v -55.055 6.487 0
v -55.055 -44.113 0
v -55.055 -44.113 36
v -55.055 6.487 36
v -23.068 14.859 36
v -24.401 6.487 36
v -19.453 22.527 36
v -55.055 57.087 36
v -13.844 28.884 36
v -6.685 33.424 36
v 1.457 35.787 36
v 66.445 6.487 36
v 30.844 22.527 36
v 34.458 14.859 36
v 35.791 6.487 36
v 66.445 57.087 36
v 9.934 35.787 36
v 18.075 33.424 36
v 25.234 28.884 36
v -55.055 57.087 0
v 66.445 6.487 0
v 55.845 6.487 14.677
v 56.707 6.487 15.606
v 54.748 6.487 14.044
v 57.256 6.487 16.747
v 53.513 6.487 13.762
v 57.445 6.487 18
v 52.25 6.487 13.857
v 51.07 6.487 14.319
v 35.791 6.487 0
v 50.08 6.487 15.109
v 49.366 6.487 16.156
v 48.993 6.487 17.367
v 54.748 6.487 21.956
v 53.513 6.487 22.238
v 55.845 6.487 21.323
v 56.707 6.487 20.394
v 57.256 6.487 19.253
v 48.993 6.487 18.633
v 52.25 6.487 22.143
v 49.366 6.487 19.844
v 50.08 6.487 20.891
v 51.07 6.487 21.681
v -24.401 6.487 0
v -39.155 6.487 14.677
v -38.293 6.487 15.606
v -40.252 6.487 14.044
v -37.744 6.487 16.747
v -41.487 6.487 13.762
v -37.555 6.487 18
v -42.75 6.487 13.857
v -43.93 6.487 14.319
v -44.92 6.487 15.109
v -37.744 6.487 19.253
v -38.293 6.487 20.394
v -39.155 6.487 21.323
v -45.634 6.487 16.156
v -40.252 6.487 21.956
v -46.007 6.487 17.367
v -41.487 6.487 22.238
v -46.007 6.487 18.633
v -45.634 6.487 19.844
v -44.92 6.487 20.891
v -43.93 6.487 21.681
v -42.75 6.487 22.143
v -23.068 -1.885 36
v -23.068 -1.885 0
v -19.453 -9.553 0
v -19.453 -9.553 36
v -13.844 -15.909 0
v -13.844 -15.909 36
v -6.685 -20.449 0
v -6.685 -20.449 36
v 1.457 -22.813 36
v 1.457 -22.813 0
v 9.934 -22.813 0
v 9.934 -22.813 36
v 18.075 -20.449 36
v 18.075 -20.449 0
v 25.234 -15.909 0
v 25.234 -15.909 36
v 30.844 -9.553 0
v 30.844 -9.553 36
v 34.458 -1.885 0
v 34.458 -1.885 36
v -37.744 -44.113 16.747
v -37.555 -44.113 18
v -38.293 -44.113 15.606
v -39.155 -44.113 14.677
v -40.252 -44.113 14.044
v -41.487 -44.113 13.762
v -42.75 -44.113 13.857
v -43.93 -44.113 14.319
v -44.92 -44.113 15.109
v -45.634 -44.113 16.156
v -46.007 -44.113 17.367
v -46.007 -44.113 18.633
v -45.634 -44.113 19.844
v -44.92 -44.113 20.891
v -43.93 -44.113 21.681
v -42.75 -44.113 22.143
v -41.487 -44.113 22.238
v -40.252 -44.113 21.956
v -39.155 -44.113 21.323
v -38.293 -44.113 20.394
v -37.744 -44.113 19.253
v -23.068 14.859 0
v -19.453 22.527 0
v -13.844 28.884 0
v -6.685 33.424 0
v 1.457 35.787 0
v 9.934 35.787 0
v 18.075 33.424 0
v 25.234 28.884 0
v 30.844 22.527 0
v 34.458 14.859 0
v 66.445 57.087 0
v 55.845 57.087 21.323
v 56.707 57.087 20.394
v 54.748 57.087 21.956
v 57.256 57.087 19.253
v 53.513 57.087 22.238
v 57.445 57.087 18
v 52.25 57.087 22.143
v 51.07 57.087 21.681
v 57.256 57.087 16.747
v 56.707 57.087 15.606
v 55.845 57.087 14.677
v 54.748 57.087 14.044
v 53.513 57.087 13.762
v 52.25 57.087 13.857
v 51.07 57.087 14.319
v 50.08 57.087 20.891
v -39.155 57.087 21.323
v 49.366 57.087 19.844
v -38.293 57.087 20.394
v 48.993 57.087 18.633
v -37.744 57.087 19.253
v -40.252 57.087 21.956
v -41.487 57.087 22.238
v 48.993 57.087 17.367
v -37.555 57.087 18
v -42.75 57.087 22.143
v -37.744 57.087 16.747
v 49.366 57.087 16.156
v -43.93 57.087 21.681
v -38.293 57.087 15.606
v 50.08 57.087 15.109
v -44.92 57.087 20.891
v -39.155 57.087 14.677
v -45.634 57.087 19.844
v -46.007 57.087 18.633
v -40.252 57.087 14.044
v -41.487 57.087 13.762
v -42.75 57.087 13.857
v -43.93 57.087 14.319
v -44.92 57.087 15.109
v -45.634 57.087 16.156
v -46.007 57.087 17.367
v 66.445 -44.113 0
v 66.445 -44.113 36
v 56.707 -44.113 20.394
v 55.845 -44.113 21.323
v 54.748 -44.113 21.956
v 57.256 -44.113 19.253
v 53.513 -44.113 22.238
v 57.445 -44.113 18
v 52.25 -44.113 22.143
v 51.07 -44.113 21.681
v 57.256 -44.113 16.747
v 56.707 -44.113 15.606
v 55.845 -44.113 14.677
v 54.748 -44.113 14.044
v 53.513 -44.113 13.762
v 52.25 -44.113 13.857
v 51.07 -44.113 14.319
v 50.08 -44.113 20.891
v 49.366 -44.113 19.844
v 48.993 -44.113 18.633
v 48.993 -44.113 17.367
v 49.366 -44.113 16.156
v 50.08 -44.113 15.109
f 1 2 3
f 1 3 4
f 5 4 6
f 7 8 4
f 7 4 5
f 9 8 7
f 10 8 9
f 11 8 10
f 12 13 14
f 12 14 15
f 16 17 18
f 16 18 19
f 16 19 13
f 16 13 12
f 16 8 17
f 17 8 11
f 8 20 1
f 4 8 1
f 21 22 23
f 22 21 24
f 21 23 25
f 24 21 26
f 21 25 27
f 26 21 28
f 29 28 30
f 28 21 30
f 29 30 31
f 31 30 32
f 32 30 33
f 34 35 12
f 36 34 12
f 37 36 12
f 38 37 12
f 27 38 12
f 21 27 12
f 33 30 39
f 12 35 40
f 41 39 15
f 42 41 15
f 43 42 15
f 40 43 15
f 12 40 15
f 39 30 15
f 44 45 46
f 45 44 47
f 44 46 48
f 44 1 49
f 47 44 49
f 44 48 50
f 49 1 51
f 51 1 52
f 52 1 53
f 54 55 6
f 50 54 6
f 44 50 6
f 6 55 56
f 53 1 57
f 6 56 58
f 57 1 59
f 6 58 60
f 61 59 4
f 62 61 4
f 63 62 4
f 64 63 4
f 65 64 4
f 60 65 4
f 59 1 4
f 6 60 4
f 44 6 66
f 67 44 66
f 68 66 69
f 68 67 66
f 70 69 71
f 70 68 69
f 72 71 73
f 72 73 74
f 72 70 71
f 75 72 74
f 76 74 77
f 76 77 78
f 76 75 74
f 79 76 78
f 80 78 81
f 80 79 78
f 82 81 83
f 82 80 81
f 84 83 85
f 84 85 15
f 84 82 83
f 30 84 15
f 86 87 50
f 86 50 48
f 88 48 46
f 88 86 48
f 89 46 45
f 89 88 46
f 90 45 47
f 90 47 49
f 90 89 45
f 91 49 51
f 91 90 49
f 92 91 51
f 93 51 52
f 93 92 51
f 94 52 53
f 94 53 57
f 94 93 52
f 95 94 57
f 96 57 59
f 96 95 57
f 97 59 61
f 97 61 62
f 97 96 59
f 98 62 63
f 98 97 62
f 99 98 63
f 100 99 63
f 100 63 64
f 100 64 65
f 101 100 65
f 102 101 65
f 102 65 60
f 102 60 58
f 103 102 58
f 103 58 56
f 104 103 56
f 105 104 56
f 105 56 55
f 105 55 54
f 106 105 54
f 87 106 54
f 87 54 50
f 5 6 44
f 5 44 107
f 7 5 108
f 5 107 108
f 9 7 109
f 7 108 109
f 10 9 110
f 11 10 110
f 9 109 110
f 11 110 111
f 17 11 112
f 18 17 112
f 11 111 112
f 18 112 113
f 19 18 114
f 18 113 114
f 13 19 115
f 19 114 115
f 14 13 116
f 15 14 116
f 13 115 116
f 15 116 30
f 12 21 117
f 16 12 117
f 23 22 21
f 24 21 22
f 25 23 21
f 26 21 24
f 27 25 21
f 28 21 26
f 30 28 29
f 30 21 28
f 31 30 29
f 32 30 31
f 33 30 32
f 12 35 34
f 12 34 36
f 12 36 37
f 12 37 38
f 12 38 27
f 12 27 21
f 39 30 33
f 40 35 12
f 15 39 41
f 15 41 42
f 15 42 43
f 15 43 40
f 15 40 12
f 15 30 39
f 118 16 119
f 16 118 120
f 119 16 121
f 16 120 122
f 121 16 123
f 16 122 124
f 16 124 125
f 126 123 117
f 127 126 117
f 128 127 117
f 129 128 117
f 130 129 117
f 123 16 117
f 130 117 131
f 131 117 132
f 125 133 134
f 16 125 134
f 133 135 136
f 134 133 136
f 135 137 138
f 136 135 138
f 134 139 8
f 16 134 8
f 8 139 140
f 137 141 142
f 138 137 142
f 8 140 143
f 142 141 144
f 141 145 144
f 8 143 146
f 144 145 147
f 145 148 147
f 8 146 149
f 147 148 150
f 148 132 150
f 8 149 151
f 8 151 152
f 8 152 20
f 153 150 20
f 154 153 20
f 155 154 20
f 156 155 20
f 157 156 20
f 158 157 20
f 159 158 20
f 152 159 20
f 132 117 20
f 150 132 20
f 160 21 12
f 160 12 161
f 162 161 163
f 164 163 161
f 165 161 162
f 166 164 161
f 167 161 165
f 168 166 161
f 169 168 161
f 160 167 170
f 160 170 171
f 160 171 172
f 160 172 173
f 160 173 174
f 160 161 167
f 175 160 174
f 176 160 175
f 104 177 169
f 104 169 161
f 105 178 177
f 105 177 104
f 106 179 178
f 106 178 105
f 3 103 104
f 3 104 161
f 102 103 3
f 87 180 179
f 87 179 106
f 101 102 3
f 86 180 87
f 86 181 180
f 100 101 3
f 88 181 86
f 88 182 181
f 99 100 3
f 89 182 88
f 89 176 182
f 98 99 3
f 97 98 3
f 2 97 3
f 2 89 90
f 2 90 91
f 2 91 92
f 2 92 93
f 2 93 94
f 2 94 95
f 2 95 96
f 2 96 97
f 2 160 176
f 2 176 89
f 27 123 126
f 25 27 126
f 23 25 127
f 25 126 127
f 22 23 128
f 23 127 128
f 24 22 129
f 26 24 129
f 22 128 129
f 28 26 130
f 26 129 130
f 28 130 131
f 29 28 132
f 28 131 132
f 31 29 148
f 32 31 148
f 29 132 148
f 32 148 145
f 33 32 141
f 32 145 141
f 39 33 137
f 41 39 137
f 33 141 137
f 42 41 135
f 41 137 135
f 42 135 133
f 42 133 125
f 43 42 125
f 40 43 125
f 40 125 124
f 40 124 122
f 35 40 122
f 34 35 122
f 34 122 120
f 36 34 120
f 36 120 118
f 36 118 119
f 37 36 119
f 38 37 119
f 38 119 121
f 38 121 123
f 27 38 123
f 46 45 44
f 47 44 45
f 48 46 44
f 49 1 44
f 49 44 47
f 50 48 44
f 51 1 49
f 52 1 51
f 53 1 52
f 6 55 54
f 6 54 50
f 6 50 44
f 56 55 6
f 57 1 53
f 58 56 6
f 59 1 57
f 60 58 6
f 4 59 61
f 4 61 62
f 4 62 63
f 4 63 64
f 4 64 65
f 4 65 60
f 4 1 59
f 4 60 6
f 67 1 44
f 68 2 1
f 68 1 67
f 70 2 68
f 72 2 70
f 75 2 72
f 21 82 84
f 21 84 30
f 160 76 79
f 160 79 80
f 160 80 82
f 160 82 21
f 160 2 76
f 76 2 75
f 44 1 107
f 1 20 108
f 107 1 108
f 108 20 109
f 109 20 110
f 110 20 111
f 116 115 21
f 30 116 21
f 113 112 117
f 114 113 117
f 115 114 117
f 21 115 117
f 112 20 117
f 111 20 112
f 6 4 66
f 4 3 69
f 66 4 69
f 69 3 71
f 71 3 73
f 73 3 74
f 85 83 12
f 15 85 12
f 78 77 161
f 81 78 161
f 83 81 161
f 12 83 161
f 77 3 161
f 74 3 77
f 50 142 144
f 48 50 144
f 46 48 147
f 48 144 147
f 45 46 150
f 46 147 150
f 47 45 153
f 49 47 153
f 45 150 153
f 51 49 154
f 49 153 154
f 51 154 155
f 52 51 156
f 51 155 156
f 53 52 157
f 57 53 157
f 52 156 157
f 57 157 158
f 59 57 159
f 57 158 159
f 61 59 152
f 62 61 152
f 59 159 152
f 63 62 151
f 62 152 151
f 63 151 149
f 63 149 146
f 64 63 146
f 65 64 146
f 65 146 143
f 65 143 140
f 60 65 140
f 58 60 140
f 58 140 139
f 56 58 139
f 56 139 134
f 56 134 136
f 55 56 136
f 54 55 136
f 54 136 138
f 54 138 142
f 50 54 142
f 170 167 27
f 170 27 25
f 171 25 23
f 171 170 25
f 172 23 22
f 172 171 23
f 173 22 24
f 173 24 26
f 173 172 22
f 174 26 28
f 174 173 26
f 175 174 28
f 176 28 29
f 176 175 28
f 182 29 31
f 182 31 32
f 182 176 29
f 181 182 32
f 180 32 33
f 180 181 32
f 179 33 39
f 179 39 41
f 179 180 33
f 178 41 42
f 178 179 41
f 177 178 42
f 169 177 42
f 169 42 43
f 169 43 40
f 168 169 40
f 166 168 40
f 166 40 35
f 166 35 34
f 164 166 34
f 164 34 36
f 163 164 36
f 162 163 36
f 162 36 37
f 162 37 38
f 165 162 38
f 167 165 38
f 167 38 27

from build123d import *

# Parameters (mm, degrees)
BOSS_EXTRUDE1_DEPTH = 36
SKETCH3_W           = 36
SKETCH3_H           = 0.5
CUT_EXTRUDE1_DEPTH  = 122.5
SKETCH4_R           = 4.25
CUT_EXTRUDE2_DEPTH  = 51.6


with BuildPart() as part:
    # Sketch1 → Boss-Extrude1 (new body)
    with BuildSketch(Plane.XY):
        with BuildLine():
            Line((66.4453125, 57.087379808), (-55.0546875, 57.087379808))
            Line((-55.0546875, 57.087379808), (-55.0546875, 5.987379808))
            Line((-55.0546875, 5.987379808), (-24.4046875, 5.987379808))
            ThreePointArc((-24.4046875, 5.987379808), (5.6953125, 36.087379808), (35.7953125, 5.987379808))
            Line((35.7953125, 5.987379808), (66.4453125, 5.987379808))
            Line((66.4453125, 5.987379808), (66.4453125, 57.087379808))
        make_face()
    extrude(amount=BOSS_EXTRUDE1_DEPTH)

    # Sketch3 → Cut-Extrude1 (cut, through all)
    with BuildSketch(Plane.ZY.offset(55.0546875)):
        with Locations((18, 6.237379808)):
            Rectangle(SKETCH3_W, SKETCH3_H)
    extrude(amount=-CUT_EXTRUDE1_DEPTH, mode=Mode.SUBTRACT)

    # Sketch4 → Cut-Extrude2 (cut, through all)
    with BuildSketch(Plane(origin=(0, 57.087379808, 0), x_dir=(1, 0, 0), z_dir=(0, 1, 0))):
        with Locations((-41.8046875, -18)):
            Circle(SKETCH4_R)
        with Locations((53.1953125, -18)):
            Circle(SKETCH4_R)
    extrude(amount=-CUT_EXTRUDE2_DEPTH, mode=Mode.SUBTRACT)


with BuildPart() as body_2:
    # Mirror2: mirrored copy
    add(part.part.mirror(Plane(origin=(66.4453125, 6.487379808, 0), x_dir=(0, 0, 1), z_dir=(0, 1, 0))))


solid = Compound([part.part, body_2.part])
